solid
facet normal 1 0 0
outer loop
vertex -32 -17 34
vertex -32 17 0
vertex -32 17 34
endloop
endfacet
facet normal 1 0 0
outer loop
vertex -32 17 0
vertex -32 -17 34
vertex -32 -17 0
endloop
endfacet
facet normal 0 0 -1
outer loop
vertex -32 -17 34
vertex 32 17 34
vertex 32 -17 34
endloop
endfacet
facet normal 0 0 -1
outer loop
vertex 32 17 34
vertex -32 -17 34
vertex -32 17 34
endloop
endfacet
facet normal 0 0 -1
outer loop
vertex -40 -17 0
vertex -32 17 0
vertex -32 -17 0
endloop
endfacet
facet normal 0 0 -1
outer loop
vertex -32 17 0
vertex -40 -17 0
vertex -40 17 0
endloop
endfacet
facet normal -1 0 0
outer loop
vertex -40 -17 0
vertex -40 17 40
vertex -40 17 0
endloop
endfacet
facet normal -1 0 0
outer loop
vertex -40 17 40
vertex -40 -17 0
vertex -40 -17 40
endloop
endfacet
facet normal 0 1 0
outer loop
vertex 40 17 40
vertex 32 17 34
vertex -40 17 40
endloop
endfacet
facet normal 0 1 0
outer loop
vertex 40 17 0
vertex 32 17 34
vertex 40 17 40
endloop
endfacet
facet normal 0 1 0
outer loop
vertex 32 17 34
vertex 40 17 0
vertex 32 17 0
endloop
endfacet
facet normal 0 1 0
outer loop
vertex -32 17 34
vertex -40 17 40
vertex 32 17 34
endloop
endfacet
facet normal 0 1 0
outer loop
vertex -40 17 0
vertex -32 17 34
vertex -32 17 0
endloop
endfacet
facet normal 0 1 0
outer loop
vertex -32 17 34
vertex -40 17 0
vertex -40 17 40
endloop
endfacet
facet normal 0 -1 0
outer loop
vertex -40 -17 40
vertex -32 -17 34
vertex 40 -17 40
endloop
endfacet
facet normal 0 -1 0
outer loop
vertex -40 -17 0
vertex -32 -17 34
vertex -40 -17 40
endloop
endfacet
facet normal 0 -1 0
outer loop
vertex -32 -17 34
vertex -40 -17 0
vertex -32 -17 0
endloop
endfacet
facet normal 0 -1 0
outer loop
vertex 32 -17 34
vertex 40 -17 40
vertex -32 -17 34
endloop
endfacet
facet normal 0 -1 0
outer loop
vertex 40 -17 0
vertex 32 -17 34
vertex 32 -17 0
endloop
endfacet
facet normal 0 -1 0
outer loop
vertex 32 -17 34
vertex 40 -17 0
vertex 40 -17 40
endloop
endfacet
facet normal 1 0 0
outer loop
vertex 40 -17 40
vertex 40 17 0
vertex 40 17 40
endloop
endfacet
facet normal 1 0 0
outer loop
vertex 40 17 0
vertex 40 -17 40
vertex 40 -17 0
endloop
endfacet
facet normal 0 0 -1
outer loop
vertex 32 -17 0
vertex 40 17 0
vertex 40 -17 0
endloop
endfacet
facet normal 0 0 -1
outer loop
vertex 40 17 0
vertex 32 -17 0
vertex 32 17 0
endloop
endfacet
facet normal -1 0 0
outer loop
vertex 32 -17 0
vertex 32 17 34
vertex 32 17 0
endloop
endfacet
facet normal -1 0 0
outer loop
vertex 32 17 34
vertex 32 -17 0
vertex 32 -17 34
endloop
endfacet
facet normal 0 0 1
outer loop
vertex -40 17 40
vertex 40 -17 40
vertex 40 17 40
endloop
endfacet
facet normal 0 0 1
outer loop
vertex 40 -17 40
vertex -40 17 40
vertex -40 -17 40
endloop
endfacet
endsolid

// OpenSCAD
// TS-PET-C13 - Track Bridge Support
$fn=72; width=34; arch_span=80; leg_w=8; leg_h=34; top_t=6;
union(){ translate([-arch_span/2+leg_w/2,0,leg_h/2]) cube([leg_w,width,leg_h],center=true); translate([ arch_span/2-leg_w/2,0,leg_h/2]) cube([leg_w,width,leg_h],center=true); translate([0,0,leg_h+top_t/2]) cube([arch_span,width,top_t],center=true); }
